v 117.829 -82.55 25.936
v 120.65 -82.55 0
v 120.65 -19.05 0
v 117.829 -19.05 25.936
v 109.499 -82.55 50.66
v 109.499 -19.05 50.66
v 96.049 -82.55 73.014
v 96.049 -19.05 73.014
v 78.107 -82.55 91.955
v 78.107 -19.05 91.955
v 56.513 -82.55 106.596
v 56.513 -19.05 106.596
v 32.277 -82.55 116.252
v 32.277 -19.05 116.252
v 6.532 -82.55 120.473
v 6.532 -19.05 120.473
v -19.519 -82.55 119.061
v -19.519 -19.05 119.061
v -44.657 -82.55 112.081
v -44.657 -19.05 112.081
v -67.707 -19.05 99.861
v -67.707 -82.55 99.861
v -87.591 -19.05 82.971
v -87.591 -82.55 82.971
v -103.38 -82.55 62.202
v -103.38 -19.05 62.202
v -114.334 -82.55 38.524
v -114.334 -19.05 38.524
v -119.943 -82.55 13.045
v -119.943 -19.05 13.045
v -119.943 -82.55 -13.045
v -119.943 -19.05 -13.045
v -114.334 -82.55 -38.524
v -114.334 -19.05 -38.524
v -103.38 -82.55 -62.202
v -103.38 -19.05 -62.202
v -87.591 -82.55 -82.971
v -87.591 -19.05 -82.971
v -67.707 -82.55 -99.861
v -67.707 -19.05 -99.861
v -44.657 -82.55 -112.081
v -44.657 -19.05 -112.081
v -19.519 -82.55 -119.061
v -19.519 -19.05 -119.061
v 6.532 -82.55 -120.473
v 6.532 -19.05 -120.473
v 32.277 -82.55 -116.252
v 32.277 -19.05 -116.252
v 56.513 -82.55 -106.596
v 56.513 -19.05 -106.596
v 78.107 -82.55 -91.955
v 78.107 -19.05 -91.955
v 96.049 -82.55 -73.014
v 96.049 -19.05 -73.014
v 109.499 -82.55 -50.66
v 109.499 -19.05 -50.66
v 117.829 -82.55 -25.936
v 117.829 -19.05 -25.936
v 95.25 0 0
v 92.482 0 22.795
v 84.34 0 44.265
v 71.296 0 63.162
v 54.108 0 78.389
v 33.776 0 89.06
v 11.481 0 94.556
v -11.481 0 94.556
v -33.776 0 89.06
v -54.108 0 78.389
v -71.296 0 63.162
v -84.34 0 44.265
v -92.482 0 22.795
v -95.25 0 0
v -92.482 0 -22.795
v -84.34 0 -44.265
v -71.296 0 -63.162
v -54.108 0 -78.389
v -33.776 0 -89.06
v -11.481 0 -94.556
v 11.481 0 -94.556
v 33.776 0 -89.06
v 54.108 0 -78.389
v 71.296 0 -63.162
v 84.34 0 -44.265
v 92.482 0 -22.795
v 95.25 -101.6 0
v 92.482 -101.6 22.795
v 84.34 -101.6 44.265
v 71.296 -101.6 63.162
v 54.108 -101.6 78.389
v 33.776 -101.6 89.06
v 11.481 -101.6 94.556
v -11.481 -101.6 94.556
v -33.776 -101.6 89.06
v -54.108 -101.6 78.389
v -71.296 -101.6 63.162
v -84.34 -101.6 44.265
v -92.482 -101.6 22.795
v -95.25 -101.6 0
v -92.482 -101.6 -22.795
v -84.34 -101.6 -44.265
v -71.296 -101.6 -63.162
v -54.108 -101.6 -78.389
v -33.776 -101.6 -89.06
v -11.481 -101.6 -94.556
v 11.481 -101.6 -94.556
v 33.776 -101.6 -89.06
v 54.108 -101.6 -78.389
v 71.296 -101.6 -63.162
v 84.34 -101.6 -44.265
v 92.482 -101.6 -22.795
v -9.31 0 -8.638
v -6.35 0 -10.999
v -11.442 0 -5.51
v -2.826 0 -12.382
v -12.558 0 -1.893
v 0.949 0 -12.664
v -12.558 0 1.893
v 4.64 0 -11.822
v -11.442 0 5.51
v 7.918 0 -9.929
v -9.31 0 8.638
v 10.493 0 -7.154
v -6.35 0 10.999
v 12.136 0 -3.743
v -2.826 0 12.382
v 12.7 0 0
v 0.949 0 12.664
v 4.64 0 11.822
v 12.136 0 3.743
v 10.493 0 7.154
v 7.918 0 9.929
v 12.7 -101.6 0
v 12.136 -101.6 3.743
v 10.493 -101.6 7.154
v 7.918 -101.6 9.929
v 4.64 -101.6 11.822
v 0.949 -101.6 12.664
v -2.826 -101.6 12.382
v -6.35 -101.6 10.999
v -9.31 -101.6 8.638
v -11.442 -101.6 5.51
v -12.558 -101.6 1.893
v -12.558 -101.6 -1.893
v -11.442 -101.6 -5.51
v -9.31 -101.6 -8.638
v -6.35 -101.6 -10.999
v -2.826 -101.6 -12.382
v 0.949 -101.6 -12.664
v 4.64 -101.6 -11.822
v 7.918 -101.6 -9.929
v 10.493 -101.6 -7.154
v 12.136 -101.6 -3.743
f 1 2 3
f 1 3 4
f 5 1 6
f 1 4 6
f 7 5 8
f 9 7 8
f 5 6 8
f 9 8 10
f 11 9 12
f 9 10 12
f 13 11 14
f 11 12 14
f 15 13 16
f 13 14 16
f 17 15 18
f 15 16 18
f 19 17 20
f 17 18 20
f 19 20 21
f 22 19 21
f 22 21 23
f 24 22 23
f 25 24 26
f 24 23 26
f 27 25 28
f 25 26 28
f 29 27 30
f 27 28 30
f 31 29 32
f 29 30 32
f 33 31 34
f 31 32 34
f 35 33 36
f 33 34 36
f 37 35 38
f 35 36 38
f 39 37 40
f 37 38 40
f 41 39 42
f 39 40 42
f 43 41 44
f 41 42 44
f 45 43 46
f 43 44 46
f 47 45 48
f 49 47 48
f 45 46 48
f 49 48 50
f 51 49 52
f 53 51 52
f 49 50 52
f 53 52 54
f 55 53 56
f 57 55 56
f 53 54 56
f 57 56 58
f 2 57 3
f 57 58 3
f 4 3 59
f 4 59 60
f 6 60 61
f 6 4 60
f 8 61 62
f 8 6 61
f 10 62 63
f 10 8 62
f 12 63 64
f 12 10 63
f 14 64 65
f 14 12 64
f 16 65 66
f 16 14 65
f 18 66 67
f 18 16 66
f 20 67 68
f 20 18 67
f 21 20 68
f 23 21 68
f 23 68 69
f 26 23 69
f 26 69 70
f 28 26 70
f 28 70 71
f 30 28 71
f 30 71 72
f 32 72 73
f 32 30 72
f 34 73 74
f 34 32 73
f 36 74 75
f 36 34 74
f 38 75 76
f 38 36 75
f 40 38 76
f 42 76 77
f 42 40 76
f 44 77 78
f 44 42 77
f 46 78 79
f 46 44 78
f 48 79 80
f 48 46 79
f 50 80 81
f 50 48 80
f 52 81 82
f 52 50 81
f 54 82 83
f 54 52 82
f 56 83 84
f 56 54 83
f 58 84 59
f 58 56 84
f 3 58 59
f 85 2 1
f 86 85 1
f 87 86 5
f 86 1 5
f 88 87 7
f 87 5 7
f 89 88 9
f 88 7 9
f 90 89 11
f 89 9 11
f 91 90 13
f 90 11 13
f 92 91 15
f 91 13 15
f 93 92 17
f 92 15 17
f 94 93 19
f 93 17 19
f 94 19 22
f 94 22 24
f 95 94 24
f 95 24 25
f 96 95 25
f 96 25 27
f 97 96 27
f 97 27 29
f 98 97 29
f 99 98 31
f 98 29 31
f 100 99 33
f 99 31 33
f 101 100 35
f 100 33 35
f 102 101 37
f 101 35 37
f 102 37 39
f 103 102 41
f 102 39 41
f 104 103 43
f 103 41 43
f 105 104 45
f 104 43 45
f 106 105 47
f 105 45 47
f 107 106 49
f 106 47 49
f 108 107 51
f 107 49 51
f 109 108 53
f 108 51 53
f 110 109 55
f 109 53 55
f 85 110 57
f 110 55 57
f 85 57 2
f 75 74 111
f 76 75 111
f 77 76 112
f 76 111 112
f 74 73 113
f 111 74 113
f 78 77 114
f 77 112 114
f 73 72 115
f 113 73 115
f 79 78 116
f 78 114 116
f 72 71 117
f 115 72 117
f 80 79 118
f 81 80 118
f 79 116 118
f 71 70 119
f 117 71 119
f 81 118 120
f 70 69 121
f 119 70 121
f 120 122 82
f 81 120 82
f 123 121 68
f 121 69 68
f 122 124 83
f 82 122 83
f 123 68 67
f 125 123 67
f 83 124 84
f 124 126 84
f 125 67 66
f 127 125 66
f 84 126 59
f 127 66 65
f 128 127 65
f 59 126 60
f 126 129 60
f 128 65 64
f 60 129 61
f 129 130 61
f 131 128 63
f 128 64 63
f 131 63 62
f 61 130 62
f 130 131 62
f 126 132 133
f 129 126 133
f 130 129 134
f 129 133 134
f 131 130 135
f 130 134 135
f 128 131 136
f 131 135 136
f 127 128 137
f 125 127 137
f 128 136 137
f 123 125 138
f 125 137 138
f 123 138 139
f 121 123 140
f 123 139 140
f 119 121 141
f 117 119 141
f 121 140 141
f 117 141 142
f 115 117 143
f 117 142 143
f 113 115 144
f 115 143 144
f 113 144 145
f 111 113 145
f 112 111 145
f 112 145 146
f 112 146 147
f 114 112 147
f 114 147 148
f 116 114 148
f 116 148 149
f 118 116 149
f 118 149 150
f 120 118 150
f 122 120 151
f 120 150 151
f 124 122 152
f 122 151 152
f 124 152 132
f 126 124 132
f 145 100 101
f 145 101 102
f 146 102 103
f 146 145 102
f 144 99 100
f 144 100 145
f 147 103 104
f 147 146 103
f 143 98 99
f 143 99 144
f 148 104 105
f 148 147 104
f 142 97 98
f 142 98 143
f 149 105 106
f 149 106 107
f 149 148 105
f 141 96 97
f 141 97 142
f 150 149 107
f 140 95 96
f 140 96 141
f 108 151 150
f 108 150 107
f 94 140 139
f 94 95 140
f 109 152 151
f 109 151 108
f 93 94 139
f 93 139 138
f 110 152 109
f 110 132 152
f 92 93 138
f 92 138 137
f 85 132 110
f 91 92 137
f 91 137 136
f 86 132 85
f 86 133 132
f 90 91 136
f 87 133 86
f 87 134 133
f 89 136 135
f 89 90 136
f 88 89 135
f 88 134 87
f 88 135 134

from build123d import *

# Parameters (mm, degrees)
F0_R       = 120.65
F1_DEPTH   = 101.6
F2_SIZE2   = 19.05
F2_SIZE    = 25.4
F2_2_SIZE2 = 19.05
F2_2_SIZE  = 25.4
F3_R       = 12.7
F4_DEPTH   = 101.6


with BuildPart() as f1:
    # F0 (on Front) → F1 (new body)
    with BuildSketch(Plane.XZ):
        Circle(F0_R)
    extrude(amount=F1_DEPTH)

    # F2
    f2_edges = [f1.edges().sort_by_distance(p)[0] for p in [
        (-120.65, -101.6, 0),
    ]]
    f2_side = f1.faces().sort_by_distance((0, -101.6, 0))[0]
    chamfer(f2_edges, length=F2_SIZE, length2=F2_SIZE2, reference=f2_side)

    # F2#2
    f2_2_edges = [f1.edges().sort_by_distance(p)[0] for p in [
        (-120.65, 0, 0),
    ]]
    f2_2_side = f1.faces().sort_by_distance((0, 0, 0))[0]
    chamfer(f2_2_edges, length=F2_2_SIZE, length2=F2_2_SIZE2, reference=f2_2_side)

    # F3 (on face) → F4 (cut, through all)
    with BuildSketch(Plane.XZ.offset(101.6)):
        Circle(F3_R)
    extrude(amount=-F4_DEPTH, mode=Mode.SUBTRACT)


solid = f1.part
